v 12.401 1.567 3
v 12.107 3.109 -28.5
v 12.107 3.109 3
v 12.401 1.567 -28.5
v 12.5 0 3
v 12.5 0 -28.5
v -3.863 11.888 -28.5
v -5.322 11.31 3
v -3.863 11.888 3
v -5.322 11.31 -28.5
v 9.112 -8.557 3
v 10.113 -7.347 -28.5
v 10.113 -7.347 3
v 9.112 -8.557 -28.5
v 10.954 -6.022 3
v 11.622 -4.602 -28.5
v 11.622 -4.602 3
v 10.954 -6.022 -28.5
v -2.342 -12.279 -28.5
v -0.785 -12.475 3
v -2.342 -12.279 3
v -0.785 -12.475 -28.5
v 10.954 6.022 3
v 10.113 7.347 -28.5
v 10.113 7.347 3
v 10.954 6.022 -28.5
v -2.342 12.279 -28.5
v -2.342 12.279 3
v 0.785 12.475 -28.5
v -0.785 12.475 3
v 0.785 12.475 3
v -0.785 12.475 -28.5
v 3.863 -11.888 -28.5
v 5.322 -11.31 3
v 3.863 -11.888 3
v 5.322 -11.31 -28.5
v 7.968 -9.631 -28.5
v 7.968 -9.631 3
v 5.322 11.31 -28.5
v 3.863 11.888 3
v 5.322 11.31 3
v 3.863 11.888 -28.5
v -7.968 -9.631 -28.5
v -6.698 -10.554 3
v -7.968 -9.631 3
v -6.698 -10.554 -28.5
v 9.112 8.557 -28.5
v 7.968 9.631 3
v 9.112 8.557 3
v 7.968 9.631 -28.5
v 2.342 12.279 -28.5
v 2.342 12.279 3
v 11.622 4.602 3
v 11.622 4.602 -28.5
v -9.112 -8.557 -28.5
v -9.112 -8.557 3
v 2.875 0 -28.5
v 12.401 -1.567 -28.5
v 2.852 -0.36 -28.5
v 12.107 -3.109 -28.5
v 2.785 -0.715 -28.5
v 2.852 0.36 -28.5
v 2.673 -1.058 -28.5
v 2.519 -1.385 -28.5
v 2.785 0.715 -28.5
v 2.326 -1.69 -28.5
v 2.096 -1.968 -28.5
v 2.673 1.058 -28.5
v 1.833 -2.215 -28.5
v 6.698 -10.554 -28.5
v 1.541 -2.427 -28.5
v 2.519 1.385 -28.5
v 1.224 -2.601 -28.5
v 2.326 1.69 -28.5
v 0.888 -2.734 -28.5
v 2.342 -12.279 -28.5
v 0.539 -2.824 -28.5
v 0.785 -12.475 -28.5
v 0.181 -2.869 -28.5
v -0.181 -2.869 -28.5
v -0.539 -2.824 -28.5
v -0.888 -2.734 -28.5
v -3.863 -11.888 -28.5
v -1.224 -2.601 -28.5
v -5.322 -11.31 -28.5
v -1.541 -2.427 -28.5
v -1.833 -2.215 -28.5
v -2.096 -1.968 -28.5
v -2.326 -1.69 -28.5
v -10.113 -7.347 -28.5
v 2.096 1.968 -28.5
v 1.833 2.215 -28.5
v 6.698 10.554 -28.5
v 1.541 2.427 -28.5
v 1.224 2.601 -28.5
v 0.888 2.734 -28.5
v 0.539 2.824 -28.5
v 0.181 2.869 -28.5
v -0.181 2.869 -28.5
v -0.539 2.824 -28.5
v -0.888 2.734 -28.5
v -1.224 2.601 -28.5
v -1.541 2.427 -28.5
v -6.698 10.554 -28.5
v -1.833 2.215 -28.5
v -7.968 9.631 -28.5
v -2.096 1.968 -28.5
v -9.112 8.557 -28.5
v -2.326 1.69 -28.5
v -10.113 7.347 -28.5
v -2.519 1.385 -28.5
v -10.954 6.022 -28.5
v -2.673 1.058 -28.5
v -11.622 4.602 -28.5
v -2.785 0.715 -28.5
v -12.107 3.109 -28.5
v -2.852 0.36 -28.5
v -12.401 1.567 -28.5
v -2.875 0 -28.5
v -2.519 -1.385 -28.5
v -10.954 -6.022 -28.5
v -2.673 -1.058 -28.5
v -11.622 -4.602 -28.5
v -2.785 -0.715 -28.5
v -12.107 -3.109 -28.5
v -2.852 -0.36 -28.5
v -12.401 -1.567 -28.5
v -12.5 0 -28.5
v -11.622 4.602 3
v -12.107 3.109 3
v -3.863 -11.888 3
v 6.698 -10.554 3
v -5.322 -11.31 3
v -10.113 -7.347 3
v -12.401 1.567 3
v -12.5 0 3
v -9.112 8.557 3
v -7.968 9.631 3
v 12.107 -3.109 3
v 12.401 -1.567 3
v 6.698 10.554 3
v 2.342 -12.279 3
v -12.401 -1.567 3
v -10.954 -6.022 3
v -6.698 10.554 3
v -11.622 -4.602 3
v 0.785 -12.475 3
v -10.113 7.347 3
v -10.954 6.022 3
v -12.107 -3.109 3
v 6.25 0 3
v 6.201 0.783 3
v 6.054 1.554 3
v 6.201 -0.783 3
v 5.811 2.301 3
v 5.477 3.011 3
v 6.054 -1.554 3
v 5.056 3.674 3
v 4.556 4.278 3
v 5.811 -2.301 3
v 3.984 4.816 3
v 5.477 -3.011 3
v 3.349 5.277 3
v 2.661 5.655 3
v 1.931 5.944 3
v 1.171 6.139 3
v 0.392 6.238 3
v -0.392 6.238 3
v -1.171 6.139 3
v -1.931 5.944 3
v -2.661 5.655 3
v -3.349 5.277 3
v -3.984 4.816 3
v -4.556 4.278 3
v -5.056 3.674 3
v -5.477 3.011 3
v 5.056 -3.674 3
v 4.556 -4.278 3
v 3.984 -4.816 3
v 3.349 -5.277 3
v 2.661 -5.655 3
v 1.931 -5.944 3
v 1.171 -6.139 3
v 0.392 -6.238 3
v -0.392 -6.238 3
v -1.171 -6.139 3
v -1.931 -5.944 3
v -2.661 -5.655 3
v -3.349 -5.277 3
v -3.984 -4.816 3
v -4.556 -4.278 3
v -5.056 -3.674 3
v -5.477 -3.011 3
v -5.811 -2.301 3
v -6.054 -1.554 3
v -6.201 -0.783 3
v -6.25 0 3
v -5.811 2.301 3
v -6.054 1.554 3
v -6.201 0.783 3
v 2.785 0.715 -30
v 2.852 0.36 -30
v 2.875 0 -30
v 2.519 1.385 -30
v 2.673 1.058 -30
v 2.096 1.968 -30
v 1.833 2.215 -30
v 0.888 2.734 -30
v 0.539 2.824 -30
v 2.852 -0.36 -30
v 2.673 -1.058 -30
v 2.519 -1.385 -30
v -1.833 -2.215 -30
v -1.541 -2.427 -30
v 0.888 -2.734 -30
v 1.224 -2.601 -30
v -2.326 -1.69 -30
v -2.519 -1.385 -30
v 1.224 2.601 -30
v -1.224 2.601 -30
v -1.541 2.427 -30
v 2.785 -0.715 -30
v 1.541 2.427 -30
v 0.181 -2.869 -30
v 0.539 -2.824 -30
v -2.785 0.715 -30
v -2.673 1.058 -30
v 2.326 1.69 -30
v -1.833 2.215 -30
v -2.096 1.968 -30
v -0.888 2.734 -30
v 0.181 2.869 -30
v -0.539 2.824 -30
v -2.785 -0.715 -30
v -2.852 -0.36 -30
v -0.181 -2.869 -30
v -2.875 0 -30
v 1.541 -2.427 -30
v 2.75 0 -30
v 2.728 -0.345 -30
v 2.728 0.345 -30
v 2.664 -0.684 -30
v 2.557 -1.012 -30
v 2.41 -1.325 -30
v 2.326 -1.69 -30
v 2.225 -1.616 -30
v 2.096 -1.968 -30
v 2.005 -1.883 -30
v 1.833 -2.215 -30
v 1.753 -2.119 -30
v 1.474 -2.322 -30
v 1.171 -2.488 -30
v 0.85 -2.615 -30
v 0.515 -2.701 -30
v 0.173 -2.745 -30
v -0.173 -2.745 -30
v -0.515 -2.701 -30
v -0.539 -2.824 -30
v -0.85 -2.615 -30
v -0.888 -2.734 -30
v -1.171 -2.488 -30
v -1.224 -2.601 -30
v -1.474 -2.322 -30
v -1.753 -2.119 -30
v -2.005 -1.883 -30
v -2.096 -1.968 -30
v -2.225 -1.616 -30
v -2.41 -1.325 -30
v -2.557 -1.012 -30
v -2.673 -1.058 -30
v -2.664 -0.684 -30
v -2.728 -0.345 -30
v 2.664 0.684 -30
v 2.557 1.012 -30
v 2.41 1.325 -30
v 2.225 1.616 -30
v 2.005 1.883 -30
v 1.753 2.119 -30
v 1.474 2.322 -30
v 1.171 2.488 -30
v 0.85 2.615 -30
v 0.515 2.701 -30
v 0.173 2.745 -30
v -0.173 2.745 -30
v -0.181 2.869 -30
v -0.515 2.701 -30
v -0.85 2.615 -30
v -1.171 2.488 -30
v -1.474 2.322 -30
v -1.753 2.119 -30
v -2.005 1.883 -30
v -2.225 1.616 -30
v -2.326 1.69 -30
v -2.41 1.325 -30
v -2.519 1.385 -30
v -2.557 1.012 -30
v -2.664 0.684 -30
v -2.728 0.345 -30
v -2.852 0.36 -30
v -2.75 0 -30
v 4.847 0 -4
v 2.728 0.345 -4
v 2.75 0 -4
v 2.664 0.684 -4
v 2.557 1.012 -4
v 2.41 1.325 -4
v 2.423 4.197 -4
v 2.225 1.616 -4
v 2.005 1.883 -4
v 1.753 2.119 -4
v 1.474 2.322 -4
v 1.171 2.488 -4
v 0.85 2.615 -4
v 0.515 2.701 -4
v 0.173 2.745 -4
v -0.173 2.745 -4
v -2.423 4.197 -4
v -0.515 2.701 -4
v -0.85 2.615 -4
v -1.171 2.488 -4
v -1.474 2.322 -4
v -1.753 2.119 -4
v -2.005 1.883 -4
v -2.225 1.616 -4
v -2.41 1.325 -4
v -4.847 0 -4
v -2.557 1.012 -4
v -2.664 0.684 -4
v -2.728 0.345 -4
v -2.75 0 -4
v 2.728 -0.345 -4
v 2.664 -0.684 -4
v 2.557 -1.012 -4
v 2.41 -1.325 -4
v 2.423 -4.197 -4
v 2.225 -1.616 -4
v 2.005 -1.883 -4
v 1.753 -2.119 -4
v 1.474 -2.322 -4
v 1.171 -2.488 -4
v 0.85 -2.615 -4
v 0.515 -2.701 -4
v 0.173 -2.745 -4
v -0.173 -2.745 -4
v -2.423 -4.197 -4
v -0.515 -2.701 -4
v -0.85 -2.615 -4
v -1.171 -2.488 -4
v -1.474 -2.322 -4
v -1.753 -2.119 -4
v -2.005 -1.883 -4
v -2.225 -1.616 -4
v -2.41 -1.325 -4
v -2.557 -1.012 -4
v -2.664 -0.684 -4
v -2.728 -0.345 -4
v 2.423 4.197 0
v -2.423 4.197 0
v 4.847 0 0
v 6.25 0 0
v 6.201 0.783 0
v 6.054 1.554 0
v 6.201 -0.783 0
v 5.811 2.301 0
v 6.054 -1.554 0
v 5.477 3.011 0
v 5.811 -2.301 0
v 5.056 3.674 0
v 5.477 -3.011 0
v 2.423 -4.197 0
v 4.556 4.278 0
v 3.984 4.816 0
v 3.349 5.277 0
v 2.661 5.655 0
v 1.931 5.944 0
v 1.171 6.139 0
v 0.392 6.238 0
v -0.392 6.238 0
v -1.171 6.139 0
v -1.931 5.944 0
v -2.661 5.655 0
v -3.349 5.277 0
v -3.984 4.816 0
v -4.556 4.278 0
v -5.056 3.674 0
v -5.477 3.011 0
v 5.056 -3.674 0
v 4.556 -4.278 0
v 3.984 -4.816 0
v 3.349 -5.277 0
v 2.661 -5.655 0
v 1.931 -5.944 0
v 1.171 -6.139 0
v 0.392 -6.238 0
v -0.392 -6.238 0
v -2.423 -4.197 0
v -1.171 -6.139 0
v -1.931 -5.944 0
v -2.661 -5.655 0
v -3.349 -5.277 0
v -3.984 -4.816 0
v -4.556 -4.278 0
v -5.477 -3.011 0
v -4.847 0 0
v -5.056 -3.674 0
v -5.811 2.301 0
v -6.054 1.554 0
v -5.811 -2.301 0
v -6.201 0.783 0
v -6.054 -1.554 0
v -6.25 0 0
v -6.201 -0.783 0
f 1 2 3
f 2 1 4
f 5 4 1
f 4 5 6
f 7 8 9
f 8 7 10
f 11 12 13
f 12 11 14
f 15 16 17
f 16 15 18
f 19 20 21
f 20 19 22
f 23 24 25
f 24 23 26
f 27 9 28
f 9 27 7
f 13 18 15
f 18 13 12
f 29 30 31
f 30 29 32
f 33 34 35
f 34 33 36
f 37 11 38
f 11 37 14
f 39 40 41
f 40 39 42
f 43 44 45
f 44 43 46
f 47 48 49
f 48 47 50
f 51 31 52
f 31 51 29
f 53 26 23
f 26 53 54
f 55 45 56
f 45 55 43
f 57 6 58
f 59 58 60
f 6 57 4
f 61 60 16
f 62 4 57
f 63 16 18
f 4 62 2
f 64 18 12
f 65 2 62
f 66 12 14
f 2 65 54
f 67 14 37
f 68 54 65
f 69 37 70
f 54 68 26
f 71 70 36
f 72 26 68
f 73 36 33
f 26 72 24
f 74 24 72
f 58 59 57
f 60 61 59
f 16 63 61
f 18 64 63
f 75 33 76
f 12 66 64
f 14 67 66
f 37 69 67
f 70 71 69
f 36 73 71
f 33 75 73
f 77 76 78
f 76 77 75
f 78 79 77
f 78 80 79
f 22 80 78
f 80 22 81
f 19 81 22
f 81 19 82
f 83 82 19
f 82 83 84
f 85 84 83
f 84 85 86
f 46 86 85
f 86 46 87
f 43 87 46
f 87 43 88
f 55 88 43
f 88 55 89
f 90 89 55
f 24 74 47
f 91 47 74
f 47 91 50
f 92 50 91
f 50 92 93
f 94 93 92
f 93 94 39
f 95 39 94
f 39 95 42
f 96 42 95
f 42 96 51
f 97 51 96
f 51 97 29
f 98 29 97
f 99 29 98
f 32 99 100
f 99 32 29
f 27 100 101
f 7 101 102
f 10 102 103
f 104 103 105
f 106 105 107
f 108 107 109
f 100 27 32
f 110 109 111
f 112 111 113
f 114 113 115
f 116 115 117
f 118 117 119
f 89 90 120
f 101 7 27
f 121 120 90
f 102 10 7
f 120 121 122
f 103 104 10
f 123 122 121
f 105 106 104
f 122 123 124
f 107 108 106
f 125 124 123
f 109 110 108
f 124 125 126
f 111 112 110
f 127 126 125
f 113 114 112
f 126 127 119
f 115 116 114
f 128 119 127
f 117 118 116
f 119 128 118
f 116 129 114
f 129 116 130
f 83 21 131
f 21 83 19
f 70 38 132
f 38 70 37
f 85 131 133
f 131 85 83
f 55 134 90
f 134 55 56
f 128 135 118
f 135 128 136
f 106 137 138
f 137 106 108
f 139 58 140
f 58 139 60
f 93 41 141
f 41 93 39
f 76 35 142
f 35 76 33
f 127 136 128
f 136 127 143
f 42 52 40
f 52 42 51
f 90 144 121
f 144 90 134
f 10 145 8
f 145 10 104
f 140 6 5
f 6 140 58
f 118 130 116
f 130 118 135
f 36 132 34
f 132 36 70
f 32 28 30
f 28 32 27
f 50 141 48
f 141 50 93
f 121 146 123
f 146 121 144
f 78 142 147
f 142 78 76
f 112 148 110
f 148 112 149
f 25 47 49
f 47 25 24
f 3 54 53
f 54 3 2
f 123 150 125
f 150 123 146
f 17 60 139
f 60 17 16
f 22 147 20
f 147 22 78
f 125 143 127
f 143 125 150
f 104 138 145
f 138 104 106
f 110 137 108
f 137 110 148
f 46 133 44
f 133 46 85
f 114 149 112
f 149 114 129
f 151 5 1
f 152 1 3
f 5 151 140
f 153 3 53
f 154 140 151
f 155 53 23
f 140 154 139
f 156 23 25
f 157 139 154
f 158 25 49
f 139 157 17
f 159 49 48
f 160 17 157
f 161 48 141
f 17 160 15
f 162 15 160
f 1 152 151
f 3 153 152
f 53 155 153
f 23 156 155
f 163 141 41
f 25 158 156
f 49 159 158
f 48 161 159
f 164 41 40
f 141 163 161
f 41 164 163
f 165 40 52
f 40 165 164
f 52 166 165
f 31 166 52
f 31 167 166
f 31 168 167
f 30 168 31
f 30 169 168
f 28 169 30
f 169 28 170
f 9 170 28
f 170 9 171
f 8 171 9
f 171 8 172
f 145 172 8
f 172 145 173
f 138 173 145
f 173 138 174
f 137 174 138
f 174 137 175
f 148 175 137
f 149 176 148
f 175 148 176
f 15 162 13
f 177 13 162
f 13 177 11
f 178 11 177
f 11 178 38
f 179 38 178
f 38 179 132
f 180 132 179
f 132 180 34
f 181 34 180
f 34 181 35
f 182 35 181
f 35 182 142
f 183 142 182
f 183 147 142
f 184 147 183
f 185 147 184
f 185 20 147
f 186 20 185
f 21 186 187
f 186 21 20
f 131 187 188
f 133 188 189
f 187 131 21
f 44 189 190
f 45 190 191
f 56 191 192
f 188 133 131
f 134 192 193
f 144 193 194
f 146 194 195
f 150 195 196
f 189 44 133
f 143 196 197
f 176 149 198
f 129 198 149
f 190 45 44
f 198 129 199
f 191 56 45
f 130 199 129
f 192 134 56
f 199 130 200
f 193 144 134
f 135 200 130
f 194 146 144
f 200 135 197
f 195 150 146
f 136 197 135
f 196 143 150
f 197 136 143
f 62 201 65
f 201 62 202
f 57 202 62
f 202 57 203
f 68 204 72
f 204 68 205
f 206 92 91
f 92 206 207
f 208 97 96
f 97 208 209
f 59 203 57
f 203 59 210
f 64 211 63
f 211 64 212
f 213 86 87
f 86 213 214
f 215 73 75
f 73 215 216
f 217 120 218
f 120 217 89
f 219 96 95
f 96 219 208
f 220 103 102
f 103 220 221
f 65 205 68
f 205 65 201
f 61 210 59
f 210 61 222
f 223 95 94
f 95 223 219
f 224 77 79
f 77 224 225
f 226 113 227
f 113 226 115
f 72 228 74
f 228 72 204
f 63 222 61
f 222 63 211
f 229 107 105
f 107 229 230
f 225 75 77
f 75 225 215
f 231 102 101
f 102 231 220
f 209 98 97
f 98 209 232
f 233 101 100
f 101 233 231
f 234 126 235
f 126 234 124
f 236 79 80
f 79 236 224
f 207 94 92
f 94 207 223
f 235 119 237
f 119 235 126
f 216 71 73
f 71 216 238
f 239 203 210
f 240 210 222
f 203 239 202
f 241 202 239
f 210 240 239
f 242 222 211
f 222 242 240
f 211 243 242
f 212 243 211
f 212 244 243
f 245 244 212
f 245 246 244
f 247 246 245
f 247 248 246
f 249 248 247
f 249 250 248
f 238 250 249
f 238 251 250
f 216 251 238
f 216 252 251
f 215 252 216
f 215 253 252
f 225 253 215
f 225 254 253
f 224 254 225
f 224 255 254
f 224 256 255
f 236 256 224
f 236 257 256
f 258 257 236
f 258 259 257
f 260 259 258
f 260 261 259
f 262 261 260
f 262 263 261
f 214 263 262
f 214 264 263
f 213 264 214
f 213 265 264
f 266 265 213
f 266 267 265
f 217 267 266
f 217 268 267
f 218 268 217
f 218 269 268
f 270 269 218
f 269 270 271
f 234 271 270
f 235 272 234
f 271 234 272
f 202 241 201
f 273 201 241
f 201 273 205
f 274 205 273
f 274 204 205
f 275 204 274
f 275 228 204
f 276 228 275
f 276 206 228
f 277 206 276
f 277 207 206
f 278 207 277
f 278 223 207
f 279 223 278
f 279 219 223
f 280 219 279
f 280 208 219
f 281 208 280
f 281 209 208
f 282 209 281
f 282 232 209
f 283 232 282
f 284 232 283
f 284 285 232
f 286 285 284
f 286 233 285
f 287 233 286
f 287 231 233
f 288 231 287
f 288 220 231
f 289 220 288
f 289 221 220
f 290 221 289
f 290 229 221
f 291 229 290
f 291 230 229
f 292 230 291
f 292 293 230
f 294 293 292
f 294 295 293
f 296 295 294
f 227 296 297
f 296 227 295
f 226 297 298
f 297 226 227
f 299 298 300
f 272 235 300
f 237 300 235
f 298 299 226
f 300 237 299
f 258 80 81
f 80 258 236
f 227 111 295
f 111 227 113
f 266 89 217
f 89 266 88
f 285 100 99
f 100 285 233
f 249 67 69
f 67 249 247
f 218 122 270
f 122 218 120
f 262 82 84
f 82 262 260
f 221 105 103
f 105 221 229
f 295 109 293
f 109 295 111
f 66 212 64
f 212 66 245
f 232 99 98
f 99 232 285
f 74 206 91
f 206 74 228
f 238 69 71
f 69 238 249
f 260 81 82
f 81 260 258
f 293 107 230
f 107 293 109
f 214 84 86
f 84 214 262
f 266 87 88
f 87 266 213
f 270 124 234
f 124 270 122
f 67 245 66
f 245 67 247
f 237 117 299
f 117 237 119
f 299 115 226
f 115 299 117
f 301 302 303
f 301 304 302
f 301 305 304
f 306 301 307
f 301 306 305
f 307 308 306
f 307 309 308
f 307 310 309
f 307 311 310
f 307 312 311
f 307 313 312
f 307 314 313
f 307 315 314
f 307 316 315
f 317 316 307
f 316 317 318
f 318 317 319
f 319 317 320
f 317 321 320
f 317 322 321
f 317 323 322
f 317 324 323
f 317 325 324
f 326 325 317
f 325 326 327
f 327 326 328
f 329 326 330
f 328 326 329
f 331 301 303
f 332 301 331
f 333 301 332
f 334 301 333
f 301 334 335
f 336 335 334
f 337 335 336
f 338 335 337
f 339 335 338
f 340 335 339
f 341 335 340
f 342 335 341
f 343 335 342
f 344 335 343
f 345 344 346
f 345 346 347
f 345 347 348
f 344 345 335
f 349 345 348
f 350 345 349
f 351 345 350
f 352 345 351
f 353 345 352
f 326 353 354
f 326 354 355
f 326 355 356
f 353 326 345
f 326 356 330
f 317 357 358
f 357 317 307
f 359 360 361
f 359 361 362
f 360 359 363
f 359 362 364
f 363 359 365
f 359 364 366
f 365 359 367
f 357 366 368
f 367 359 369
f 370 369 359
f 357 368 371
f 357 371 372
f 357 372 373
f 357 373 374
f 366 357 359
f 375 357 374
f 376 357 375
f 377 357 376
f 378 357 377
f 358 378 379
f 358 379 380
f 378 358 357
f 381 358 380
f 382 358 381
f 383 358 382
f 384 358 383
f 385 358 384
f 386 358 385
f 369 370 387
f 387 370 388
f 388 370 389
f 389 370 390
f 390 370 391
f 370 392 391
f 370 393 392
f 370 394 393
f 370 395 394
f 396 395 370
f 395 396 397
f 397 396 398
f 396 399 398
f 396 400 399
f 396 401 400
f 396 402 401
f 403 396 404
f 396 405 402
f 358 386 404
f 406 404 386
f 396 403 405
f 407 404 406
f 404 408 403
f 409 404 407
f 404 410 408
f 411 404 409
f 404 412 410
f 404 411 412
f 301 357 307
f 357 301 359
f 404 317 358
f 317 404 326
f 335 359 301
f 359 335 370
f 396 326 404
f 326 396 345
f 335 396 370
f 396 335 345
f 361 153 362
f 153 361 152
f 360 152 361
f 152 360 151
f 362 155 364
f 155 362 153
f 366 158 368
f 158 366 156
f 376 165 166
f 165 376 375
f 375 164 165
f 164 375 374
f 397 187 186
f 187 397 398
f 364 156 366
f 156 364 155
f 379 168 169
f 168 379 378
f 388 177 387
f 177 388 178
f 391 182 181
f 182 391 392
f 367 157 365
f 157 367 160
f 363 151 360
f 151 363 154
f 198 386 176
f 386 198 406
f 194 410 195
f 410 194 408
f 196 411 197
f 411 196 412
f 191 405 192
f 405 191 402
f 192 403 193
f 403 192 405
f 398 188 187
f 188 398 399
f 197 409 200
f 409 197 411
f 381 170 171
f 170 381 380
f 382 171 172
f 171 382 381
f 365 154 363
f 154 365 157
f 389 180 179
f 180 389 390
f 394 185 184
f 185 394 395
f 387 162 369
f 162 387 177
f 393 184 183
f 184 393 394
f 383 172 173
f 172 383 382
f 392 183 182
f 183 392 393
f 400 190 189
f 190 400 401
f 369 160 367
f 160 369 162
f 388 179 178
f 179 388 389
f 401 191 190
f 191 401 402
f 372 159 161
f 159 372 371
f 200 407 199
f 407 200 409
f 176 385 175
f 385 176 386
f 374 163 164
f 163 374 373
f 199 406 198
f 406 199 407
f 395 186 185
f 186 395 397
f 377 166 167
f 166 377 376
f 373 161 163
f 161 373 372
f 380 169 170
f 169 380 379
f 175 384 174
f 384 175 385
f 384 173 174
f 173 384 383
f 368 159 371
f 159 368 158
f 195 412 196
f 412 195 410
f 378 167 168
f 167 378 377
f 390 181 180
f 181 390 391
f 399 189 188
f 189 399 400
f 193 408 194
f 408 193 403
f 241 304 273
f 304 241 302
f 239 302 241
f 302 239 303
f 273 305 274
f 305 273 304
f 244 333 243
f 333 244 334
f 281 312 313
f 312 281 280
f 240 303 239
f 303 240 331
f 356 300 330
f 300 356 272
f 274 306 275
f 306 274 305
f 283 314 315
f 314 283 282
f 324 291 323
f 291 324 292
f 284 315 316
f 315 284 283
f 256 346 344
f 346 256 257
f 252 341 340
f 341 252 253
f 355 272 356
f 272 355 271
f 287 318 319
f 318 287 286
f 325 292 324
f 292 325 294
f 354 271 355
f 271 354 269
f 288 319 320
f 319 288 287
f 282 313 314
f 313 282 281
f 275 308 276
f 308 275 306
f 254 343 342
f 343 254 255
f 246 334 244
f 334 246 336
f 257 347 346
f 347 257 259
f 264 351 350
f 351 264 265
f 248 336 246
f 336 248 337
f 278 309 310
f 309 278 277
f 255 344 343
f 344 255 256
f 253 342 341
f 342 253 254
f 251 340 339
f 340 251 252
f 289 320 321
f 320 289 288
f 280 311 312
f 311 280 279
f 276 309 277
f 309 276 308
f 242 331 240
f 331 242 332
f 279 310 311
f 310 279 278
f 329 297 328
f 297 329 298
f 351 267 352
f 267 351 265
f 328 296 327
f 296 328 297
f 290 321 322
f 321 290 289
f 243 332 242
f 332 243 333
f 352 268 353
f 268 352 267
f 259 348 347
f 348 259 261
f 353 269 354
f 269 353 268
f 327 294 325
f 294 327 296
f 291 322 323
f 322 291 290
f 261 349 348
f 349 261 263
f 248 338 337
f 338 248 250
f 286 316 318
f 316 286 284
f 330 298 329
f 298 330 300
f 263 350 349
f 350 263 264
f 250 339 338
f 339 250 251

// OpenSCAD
$fn = 50;

difference() {
	union() {
		translate(v = [0, 0, -28.5]) {
			cylinder(h = 31.5, r = 12.5);
		}
		#translate(v = [0, 0, -30.0]) {
			cylinder(h = 30, r = 2.875);
		}
	}
	union() {
		translate(v = [0, 0, 0]) {
			rotate(a = [0, 0, 0]) {
				difference() {
					union() {
						translate(v = [0, 0, -4]) {
							linear_extrude(height = 4) {
								polygon(points = [[4.8468, 0.0], [2.4234000000000004, 4.197451927062417], [-2.423399999999999, 4.197451927062417], [-4.8468, 5.935618106107392e-16], [-2.423400000000002, -4.197451927062416], [2.423399999999997, -4.197451927062419]]);
							}
						}
					}
					union();
				}
			}
		}
		#cylinder(h = 3, r = 6.25);
		#translate(v = [0, 0, -100.0]) {
			cylinder(h = 200, r = 2.75);
		}
	}
}
